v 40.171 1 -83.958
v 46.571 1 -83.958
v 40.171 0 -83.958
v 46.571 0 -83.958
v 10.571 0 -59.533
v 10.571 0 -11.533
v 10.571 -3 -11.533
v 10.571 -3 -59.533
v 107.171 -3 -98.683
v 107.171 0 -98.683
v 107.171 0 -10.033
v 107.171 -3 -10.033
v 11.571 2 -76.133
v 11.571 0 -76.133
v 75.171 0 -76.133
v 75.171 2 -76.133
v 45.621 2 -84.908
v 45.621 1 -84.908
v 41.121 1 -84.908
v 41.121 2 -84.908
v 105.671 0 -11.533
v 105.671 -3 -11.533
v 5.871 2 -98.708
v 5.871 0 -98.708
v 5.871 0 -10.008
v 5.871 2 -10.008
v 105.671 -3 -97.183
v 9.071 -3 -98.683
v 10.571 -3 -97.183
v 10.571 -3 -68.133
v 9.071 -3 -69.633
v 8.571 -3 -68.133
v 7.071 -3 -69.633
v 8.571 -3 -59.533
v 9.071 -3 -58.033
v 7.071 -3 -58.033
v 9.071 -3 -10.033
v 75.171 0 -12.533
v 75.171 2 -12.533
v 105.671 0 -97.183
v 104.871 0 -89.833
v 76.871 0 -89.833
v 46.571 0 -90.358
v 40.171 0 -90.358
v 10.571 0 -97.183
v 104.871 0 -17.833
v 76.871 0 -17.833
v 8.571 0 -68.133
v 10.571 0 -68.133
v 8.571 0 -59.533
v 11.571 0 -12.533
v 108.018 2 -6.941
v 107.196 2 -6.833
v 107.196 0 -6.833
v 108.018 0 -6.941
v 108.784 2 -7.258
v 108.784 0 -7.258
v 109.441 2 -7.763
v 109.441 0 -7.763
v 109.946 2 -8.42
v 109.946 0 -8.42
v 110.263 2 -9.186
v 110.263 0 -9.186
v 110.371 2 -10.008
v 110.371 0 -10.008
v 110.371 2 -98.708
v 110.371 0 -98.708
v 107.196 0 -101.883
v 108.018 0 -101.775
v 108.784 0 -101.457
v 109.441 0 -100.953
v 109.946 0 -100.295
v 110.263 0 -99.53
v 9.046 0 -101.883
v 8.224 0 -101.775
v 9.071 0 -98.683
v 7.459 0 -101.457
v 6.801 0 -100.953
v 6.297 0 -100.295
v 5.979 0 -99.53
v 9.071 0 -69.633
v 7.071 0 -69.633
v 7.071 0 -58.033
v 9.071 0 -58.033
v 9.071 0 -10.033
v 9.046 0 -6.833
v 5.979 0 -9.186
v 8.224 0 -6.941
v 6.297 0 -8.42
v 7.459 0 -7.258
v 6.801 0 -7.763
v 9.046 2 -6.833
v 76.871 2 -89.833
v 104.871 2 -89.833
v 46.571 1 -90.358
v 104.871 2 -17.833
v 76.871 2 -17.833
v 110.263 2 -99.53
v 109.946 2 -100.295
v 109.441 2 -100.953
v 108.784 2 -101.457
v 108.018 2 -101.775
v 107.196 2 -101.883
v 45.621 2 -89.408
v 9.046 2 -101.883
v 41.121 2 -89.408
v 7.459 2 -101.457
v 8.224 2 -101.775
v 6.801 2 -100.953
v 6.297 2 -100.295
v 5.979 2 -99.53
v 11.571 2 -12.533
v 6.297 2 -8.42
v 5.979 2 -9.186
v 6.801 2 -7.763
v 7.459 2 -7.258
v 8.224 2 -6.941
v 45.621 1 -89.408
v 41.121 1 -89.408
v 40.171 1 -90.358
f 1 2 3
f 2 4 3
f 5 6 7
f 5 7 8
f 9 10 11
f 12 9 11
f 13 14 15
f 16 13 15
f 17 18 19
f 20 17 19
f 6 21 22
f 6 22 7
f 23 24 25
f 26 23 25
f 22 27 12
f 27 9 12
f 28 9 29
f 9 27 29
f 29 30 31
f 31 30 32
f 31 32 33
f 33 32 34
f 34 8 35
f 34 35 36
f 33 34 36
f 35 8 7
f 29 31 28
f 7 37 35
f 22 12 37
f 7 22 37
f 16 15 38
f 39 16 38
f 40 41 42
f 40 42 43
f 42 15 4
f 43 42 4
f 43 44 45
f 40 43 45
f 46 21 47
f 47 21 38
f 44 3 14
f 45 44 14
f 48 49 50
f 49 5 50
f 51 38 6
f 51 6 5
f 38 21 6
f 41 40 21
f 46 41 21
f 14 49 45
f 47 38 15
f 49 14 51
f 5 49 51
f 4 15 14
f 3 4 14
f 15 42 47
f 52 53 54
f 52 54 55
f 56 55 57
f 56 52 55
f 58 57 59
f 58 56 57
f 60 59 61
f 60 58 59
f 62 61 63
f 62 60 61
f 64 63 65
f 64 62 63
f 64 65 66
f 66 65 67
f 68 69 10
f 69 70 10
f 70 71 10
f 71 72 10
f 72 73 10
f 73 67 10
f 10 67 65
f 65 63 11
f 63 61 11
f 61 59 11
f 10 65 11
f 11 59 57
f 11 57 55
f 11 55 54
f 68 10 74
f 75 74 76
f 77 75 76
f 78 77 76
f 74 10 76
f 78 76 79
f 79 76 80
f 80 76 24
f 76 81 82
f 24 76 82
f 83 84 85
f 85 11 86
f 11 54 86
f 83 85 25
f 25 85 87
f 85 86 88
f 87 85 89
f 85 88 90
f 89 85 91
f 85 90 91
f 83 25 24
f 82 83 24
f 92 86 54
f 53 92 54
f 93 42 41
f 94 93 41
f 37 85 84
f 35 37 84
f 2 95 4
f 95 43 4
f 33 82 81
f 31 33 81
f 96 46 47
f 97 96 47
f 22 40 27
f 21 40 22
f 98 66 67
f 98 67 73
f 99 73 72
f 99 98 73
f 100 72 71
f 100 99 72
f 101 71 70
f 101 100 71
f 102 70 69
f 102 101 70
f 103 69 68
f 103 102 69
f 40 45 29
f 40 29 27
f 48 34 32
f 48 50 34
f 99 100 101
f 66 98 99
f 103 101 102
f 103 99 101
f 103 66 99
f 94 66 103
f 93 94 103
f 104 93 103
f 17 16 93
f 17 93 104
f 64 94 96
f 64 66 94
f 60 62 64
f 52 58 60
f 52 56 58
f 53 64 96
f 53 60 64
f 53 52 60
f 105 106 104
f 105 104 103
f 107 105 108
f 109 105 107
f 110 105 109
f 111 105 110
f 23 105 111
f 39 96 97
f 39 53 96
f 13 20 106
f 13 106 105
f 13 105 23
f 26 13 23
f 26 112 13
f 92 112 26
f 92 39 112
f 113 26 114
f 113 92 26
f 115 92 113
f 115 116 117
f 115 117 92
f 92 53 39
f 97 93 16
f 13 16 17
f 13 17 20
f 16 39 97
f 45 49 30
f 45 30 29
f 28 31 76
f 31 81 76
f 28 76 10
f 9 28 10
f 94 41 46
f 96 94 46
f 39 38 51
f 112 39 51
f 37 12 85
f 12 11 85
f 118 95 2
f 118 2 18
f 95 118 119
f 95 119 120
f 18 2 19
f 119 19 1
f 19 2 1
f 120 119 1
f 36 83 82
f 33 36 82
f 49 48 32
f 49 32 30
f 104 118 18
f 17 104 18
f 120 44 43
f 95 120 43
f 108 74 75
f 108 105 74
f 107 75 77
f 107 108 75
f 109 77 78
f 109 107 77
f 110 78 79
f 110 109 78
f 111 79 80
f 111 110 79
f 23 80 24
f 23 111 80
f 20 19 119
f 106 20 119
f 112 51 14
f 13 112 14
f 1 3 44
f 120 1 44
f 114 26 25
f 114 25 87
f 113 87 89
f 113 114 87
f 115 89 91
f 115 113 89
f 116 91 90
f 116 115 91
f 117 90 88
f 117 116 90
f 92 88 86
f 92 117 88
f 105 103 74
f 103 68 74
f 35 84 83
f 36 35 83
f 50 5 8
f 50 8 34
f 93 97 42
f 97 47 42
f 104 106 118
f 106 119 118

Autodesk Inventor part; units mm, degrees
ref_plane "YZ Plane" through (0, 0, 0) normal (1, 0, 0) x (0, 1, 0)
ref_plane "XZ Plane" through (0, 0, 0) normal (0, 1, 0) x (-1, 0, 0)
ref_plane "XY Plane" through (0, 0, 0) normal (0, 0, 1) x (1, 0, 0)
sketch "Sketch1" plane through (0, 0, 0) normal (0, 1, 0) x (-1, 0, 0)
  circle A0 centre (-103.3712, -13.8328) radius 2.5
  circle A1 centre (-103.3712, -93.8328) radius 2.5
  circle A2 centre (-78.3712, -13.8328) radius 2.5
  circle A3 centre (-78.3712, -93.8328) radius 2.5
  line L0 (-8.8712, -9.8328) -> (-107.3712, -9.8328)
  line L1 (-107.3712, -9.8328) -> (-107.3712, -98.8828)
  line L2 (-107.3712, -98.8828) -> (-8.8712, -98.8828)
  line L3 (-8.8712, -98.8828) -> (-8.8712, -69.8328)
  line L4 (-5.8712, -69.8328) -> (-8.8712, -69.8328)
  line L5 (-5.8712, -57.8328) -> (-5.8712, -69.8328)
  line L6 (-5.8712, -57.8328) -> (-8.8712, -57.8328)
  line L7 (-8.8712, -57.8328) -> (-8.8712, -9.8328)
  line L8 (-8.8712, -57.8328) -> (-6.8712, -57.8328)
  line L9 (-6.8712, -57.8328) -> (-6.8712, -69.8328)
  line L10 (-6.8712, -69.8328) -> (-8.8712, -69.8328)
  line L11 (-8.8712, -69.8328) -> (-8.8712, -98.8828)
  line L12 (-8.8712, -98.8828) -> (-107.3712, -98.8828)
  line L13 (-107.3712, -98.8828) -> (-107.3712, -9.8328)
  line L14 (-107.3712, -9.8328) -> (-8.8712, -9.8328)
  line L15 (-8.8712, -9.8328) -> (-8.8712, -57.8328)
  line L16 (-5.8712, -6.8328) -> (-110.3712, -6.8328)
  line L17 (-110.3712, -6.8328) -> (-110.3712, -101.8828)
  line L18 (-110.3712, -101.8828) -> (-5.8712, -101.8828)
  line L19 (-5.8712, -101.8828) -> (-5.8712, -6.8328)
  line L20 (-103.3712, -93.8328) -> (-78.3712, -93.8328) construction
  line L21 (-78.3712, -93.8328) -> (-78.3712, -13.8328) construction
  line L22 (-78.3712, -13.8328) -> (-103.3712, -13.8328) construction
  line L23 (-103.3712, -13.8328) -> (-103.3712, -93.8328) construction
  line L24 (-90.8712, -93.8328) -> (-90.8712, -13.8328) construction
  line L25 (-103.3712, -53.8328) -> (-78.3712, -53.8328) construction
  line L26 (-76.8712, -89.8328) -> (-104.8712, -89.8328)
  line L27 (-104.8712, -89.8328) -> (-104.8712, -17.8328)
  line L28 (-104.8712, -17.8328) -> (-76.8712, -17.8328)
  line L29 (-76.8712, -17.8328) -> (-76.8712, -89.8328)
  line L30 (-76.8712, -89.8328) -> (-104.8712, -17.8328) construction
  line L31 (-104.8712, -89.8328) -> (-76.8712, -17.8328) construction
  line L32 (-9.0712, -58.0328) -> (-7.0712, -58.0328)
  line L33 (-7.0712, -58.0328) -> (-7.0712, -69.6328)
  line L34 (-7.0712, -69.6328) -> (-9.0712, -69.6328)
  line L35 (-9.0712, -69.6328) -> (-9.0712, -98.6828)
  line L36 (-9.0712, -98.6828) -> (-107.1712, -98.6828)
  line L37 (-107.1712, -98.6828) -> (-107.1712, -10.0328)
  line L38 (-107.1712, -10.0328) -> (-9.0712, -10.0328)
  line L39 (-9.0712, -10.0328) -> (-9.0712, -58.0328)
  line L40 (-10.5712, -59.5328) -> (-8.5712, -59.5328)
  line L41 (-8.5712, -59.5328) -> (-8.5712, -68.1328)
  line L42 (-8.5712, -68.1328) -> (-10.5712, -68.1328)
  line L43 (-10.5712, -68.1328) -> (-10.5712, -97.1828)
  line L44 (-10.5712, -97.1828) -> (-105.6712, -97.1828)
  line L45 (-105.6712, -97.1828) -> (-105.6712, -11.5328)
  line L46 (-105.6712, -11.5328) -> (-10.5712, -11.5328)
  line L47 (-10.5712, -11.5328) -> (-10.5712, -59.5328)
  line L48 (-10.5712, -11.5328) -> (-76.1712, -11.5328)
  line L49 (-76.1712, -11.5328) -> (-76.1712, -77.1328)
  line L50 (-76.1712, -77.1328) -> (-10.5712, -77.1328)
  line L51 (-10.5712, -77.1328) -> (-10.5712, -11.5328)
  line L52 (-11.5712, -76.1328) -> (-75.1712, -76.1328)
  line L53 (-75.1712, -76.1328) -> (-75.1712, -12.5328)
  line L54 (-75.1712, -12.5328) -> (-11.5712, -12.5328)
  line L55 (-11.5712, -12.5328) -> (-11.5712, -76.1328)
  line L56 (-76.1712, -77.1328) -> (-10.5712, -77.1328)
  line L57 (-10.5712, -77.1328) -> (-10.5712, -97.1828)
  line L58 (-10.5712, -97.1828) -> (-76.1712, -97.1828)
  line L59 (-76.1712, -97.1828) -> (-76.1712, -77.1328)
  line L60 (-43.3712, -97.1828) -> (-43.3712, -77.1328) construction
  line L61 (-10.5712, -87.1578) -> (-76.1712, -87.1578) construction
  line L62 (-40.1712, -90.3578) -> (-46.5712, -90.3578)
  line L63 (-46.5712, -90.3578) -> (-46.5712, -83.9578)
  line L64 (-46.5712, -83.9578) -> (-40.1712, -83.9578)
  line L65 (-40.1712, -83.9578) -> (-40.1712, -90.3578)
  line L66 (-40.1712, -90.3578) -> (-46.5712, -83.9578) construction
  line L67 (-46.5712, -90.3578) -> (-40.1712, -83.9578) construction
  line L68 (-41.1212, -89.4078) -> (-45.6212, -89.4078)
  line L69 (-45.6212, -89.4078) -> (-45.6212, -84.9078)
  line L70 (-45.6212, -84.9078) -> (-41.1212, -84.9078)
  line L71 (-41.1212, -84.9078) -> (-41.1212, -89.4078)
  line L72 (-41.1212, -89.4078) -> (-45.6212, -84.9078) construction
  line L73 (-45.6212, -89.4078) -> (-41.1212, -84.9078) construction
  point P0 (0, 0)
  point P1 (-90.8712, -53.8328)
  point P2 (-105.6712, -94.8126)
  point P3 (-105.6712, -92.853)
  point P4 (-105.6712, -14.8126)
  point P5 (-105.6712, -12.853)
  point P6 (-104.351, -11.5328)
  point P7 (-102.3914, -11.5328)
  point P8 (-79.351, -11.5328)
  point P9 (-77.3914, -11.5328)
  point P10 (-43.3712, -87.1578)
  dimension "d0" = 28
  dimension "d1" = 72
  dimension "d2" = 0.2
  dimension "d3" = 1.5
  dimension "d10" = 65.6
  dimension "d11" = 65.6
  dimension "d12" = 1
  dimension "d15" = 6.4
  dimension "d16" = 6.4
  dimension "d17" = 4.5
  dimension "d18" = 4.5
extrude "Extrusion1" add sketch "Sketch1" against normal blind 3 contours L46 A0 | A0 L45 | A2 L46 | L45 A1 | L32 L33 L34 L35 L36 L37 L38 L39 picked at (-105.721, -93.6661)
extrude "Extrusion2" add sketch "Sketch1" along normal blind 2 contours A0 L45 L46 | A0 L46 A2 L49 L59 A3 L44 L45 A1 | L46 A0 | A0 L45 | A0 L45 L46 | L46 A2 L49 | A2 L46 | L45 A1 | A1 L45 | L46 L49 A2 | L49 A2 | A2 L49 L46 L47 L51 L43 L50 | L50 L43 L44 L59 A3 | L59 A3 | A3 L59 | L40 L41 L42 L51 | L7 L6 L9 L4 L3 L2 L1 L0 | L0 L1 L2 L3 L4 L19 L18 L17 L16 L6 L7 | L6 L5 L4 L9 | L26 L27 L28 L29 | L32 L33 L34 L35 L36 L37 L38 L39 | L52 L53 L54 L55 | L62 L63 L64 L65 | L68 L69 L70 L71
extrude "Extrusion3" cut sketch "Sketch1" along normal up to surface (2 mm away) contours L26 L27 L28 L29
extrude "Extrusion4" cut sketch "Sketch1" along normal up to surface (2 mm away) contours L52 L53 L54 L55
extrude "Extrusion5" cut sketch "Sketch1" along normal up to surface (2 mm away) contours L68 L69 L70 L71
extrude "Extrusion6" cut sketch "Sketch1" along normal blind 1 contours L62 L63 L64 L65
fillet "Fillet1" radius 3.175 4 edges at (5.8712, 1, -101.8828) (5.8712, 1, -6.8328) (110.3712, 1, -6.8328) (110.3712, 1, -101.8828)
properties part number "EnclosureLid"
